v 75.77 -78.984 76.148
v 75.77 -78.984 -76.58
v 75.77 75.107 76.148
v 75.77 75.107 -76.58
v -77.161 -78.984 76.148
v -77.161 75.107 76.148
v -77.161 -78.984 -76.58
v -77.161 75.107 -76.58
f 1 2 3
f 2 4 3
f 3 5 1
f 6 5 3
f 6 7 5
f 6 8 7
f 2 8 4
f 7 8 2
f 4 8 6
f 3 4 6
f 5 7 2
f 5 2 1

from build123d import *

# Parameters (mm, degrees)
F0_W     = 152.9306843877
F0_H     = 152.7281180024
F1_DEPTH = 25.4
F2_DEPTH = 75.1067474484
F3_DEPTH = 53.5841081291
F4_DEPTH = 25.399999693


with BuildPart() as f1:
    # F0 (on Front) → F1 (new body)
    with BuildSketch(Plane.XZ):
        with Locations((-0.6955824792, -0.2161078155)):
            Rectangle(F0_W, F0_H)
    extrude(amount=F1_DEPTH)

    # F2 (add): faces of the model
    f2_faces = [f1.faces().sort_by_distance(p)[0] for p in [
        (-0.6955824792, 0, -0.2161078155),
        (-0.6955824792, -25.4, -0.2161078155),
    ]]
    extrude(f2_faces, amount=F2_DEPTH, dir=(0, 1, 0))

    # F3 (add): a face of the model
    f3_faces = [f1.faces().sort_by_distance(p)[0] for p in [
        (-0.6955824792, -25.4, -0.2161078155),
    ]]
    extrude(f3_faces, amount=F3_DEPTH)

    # F4 (add): a face of the model
    f4_faces = [f1.faces().sort_by_distance(p)[0] for p in [
        (-77.1609246731, -1.9386803403, -0.2161078155),
    ]]
    extrude(f4_faces, amount=-F4_DEPTH)


solid = f1.part
